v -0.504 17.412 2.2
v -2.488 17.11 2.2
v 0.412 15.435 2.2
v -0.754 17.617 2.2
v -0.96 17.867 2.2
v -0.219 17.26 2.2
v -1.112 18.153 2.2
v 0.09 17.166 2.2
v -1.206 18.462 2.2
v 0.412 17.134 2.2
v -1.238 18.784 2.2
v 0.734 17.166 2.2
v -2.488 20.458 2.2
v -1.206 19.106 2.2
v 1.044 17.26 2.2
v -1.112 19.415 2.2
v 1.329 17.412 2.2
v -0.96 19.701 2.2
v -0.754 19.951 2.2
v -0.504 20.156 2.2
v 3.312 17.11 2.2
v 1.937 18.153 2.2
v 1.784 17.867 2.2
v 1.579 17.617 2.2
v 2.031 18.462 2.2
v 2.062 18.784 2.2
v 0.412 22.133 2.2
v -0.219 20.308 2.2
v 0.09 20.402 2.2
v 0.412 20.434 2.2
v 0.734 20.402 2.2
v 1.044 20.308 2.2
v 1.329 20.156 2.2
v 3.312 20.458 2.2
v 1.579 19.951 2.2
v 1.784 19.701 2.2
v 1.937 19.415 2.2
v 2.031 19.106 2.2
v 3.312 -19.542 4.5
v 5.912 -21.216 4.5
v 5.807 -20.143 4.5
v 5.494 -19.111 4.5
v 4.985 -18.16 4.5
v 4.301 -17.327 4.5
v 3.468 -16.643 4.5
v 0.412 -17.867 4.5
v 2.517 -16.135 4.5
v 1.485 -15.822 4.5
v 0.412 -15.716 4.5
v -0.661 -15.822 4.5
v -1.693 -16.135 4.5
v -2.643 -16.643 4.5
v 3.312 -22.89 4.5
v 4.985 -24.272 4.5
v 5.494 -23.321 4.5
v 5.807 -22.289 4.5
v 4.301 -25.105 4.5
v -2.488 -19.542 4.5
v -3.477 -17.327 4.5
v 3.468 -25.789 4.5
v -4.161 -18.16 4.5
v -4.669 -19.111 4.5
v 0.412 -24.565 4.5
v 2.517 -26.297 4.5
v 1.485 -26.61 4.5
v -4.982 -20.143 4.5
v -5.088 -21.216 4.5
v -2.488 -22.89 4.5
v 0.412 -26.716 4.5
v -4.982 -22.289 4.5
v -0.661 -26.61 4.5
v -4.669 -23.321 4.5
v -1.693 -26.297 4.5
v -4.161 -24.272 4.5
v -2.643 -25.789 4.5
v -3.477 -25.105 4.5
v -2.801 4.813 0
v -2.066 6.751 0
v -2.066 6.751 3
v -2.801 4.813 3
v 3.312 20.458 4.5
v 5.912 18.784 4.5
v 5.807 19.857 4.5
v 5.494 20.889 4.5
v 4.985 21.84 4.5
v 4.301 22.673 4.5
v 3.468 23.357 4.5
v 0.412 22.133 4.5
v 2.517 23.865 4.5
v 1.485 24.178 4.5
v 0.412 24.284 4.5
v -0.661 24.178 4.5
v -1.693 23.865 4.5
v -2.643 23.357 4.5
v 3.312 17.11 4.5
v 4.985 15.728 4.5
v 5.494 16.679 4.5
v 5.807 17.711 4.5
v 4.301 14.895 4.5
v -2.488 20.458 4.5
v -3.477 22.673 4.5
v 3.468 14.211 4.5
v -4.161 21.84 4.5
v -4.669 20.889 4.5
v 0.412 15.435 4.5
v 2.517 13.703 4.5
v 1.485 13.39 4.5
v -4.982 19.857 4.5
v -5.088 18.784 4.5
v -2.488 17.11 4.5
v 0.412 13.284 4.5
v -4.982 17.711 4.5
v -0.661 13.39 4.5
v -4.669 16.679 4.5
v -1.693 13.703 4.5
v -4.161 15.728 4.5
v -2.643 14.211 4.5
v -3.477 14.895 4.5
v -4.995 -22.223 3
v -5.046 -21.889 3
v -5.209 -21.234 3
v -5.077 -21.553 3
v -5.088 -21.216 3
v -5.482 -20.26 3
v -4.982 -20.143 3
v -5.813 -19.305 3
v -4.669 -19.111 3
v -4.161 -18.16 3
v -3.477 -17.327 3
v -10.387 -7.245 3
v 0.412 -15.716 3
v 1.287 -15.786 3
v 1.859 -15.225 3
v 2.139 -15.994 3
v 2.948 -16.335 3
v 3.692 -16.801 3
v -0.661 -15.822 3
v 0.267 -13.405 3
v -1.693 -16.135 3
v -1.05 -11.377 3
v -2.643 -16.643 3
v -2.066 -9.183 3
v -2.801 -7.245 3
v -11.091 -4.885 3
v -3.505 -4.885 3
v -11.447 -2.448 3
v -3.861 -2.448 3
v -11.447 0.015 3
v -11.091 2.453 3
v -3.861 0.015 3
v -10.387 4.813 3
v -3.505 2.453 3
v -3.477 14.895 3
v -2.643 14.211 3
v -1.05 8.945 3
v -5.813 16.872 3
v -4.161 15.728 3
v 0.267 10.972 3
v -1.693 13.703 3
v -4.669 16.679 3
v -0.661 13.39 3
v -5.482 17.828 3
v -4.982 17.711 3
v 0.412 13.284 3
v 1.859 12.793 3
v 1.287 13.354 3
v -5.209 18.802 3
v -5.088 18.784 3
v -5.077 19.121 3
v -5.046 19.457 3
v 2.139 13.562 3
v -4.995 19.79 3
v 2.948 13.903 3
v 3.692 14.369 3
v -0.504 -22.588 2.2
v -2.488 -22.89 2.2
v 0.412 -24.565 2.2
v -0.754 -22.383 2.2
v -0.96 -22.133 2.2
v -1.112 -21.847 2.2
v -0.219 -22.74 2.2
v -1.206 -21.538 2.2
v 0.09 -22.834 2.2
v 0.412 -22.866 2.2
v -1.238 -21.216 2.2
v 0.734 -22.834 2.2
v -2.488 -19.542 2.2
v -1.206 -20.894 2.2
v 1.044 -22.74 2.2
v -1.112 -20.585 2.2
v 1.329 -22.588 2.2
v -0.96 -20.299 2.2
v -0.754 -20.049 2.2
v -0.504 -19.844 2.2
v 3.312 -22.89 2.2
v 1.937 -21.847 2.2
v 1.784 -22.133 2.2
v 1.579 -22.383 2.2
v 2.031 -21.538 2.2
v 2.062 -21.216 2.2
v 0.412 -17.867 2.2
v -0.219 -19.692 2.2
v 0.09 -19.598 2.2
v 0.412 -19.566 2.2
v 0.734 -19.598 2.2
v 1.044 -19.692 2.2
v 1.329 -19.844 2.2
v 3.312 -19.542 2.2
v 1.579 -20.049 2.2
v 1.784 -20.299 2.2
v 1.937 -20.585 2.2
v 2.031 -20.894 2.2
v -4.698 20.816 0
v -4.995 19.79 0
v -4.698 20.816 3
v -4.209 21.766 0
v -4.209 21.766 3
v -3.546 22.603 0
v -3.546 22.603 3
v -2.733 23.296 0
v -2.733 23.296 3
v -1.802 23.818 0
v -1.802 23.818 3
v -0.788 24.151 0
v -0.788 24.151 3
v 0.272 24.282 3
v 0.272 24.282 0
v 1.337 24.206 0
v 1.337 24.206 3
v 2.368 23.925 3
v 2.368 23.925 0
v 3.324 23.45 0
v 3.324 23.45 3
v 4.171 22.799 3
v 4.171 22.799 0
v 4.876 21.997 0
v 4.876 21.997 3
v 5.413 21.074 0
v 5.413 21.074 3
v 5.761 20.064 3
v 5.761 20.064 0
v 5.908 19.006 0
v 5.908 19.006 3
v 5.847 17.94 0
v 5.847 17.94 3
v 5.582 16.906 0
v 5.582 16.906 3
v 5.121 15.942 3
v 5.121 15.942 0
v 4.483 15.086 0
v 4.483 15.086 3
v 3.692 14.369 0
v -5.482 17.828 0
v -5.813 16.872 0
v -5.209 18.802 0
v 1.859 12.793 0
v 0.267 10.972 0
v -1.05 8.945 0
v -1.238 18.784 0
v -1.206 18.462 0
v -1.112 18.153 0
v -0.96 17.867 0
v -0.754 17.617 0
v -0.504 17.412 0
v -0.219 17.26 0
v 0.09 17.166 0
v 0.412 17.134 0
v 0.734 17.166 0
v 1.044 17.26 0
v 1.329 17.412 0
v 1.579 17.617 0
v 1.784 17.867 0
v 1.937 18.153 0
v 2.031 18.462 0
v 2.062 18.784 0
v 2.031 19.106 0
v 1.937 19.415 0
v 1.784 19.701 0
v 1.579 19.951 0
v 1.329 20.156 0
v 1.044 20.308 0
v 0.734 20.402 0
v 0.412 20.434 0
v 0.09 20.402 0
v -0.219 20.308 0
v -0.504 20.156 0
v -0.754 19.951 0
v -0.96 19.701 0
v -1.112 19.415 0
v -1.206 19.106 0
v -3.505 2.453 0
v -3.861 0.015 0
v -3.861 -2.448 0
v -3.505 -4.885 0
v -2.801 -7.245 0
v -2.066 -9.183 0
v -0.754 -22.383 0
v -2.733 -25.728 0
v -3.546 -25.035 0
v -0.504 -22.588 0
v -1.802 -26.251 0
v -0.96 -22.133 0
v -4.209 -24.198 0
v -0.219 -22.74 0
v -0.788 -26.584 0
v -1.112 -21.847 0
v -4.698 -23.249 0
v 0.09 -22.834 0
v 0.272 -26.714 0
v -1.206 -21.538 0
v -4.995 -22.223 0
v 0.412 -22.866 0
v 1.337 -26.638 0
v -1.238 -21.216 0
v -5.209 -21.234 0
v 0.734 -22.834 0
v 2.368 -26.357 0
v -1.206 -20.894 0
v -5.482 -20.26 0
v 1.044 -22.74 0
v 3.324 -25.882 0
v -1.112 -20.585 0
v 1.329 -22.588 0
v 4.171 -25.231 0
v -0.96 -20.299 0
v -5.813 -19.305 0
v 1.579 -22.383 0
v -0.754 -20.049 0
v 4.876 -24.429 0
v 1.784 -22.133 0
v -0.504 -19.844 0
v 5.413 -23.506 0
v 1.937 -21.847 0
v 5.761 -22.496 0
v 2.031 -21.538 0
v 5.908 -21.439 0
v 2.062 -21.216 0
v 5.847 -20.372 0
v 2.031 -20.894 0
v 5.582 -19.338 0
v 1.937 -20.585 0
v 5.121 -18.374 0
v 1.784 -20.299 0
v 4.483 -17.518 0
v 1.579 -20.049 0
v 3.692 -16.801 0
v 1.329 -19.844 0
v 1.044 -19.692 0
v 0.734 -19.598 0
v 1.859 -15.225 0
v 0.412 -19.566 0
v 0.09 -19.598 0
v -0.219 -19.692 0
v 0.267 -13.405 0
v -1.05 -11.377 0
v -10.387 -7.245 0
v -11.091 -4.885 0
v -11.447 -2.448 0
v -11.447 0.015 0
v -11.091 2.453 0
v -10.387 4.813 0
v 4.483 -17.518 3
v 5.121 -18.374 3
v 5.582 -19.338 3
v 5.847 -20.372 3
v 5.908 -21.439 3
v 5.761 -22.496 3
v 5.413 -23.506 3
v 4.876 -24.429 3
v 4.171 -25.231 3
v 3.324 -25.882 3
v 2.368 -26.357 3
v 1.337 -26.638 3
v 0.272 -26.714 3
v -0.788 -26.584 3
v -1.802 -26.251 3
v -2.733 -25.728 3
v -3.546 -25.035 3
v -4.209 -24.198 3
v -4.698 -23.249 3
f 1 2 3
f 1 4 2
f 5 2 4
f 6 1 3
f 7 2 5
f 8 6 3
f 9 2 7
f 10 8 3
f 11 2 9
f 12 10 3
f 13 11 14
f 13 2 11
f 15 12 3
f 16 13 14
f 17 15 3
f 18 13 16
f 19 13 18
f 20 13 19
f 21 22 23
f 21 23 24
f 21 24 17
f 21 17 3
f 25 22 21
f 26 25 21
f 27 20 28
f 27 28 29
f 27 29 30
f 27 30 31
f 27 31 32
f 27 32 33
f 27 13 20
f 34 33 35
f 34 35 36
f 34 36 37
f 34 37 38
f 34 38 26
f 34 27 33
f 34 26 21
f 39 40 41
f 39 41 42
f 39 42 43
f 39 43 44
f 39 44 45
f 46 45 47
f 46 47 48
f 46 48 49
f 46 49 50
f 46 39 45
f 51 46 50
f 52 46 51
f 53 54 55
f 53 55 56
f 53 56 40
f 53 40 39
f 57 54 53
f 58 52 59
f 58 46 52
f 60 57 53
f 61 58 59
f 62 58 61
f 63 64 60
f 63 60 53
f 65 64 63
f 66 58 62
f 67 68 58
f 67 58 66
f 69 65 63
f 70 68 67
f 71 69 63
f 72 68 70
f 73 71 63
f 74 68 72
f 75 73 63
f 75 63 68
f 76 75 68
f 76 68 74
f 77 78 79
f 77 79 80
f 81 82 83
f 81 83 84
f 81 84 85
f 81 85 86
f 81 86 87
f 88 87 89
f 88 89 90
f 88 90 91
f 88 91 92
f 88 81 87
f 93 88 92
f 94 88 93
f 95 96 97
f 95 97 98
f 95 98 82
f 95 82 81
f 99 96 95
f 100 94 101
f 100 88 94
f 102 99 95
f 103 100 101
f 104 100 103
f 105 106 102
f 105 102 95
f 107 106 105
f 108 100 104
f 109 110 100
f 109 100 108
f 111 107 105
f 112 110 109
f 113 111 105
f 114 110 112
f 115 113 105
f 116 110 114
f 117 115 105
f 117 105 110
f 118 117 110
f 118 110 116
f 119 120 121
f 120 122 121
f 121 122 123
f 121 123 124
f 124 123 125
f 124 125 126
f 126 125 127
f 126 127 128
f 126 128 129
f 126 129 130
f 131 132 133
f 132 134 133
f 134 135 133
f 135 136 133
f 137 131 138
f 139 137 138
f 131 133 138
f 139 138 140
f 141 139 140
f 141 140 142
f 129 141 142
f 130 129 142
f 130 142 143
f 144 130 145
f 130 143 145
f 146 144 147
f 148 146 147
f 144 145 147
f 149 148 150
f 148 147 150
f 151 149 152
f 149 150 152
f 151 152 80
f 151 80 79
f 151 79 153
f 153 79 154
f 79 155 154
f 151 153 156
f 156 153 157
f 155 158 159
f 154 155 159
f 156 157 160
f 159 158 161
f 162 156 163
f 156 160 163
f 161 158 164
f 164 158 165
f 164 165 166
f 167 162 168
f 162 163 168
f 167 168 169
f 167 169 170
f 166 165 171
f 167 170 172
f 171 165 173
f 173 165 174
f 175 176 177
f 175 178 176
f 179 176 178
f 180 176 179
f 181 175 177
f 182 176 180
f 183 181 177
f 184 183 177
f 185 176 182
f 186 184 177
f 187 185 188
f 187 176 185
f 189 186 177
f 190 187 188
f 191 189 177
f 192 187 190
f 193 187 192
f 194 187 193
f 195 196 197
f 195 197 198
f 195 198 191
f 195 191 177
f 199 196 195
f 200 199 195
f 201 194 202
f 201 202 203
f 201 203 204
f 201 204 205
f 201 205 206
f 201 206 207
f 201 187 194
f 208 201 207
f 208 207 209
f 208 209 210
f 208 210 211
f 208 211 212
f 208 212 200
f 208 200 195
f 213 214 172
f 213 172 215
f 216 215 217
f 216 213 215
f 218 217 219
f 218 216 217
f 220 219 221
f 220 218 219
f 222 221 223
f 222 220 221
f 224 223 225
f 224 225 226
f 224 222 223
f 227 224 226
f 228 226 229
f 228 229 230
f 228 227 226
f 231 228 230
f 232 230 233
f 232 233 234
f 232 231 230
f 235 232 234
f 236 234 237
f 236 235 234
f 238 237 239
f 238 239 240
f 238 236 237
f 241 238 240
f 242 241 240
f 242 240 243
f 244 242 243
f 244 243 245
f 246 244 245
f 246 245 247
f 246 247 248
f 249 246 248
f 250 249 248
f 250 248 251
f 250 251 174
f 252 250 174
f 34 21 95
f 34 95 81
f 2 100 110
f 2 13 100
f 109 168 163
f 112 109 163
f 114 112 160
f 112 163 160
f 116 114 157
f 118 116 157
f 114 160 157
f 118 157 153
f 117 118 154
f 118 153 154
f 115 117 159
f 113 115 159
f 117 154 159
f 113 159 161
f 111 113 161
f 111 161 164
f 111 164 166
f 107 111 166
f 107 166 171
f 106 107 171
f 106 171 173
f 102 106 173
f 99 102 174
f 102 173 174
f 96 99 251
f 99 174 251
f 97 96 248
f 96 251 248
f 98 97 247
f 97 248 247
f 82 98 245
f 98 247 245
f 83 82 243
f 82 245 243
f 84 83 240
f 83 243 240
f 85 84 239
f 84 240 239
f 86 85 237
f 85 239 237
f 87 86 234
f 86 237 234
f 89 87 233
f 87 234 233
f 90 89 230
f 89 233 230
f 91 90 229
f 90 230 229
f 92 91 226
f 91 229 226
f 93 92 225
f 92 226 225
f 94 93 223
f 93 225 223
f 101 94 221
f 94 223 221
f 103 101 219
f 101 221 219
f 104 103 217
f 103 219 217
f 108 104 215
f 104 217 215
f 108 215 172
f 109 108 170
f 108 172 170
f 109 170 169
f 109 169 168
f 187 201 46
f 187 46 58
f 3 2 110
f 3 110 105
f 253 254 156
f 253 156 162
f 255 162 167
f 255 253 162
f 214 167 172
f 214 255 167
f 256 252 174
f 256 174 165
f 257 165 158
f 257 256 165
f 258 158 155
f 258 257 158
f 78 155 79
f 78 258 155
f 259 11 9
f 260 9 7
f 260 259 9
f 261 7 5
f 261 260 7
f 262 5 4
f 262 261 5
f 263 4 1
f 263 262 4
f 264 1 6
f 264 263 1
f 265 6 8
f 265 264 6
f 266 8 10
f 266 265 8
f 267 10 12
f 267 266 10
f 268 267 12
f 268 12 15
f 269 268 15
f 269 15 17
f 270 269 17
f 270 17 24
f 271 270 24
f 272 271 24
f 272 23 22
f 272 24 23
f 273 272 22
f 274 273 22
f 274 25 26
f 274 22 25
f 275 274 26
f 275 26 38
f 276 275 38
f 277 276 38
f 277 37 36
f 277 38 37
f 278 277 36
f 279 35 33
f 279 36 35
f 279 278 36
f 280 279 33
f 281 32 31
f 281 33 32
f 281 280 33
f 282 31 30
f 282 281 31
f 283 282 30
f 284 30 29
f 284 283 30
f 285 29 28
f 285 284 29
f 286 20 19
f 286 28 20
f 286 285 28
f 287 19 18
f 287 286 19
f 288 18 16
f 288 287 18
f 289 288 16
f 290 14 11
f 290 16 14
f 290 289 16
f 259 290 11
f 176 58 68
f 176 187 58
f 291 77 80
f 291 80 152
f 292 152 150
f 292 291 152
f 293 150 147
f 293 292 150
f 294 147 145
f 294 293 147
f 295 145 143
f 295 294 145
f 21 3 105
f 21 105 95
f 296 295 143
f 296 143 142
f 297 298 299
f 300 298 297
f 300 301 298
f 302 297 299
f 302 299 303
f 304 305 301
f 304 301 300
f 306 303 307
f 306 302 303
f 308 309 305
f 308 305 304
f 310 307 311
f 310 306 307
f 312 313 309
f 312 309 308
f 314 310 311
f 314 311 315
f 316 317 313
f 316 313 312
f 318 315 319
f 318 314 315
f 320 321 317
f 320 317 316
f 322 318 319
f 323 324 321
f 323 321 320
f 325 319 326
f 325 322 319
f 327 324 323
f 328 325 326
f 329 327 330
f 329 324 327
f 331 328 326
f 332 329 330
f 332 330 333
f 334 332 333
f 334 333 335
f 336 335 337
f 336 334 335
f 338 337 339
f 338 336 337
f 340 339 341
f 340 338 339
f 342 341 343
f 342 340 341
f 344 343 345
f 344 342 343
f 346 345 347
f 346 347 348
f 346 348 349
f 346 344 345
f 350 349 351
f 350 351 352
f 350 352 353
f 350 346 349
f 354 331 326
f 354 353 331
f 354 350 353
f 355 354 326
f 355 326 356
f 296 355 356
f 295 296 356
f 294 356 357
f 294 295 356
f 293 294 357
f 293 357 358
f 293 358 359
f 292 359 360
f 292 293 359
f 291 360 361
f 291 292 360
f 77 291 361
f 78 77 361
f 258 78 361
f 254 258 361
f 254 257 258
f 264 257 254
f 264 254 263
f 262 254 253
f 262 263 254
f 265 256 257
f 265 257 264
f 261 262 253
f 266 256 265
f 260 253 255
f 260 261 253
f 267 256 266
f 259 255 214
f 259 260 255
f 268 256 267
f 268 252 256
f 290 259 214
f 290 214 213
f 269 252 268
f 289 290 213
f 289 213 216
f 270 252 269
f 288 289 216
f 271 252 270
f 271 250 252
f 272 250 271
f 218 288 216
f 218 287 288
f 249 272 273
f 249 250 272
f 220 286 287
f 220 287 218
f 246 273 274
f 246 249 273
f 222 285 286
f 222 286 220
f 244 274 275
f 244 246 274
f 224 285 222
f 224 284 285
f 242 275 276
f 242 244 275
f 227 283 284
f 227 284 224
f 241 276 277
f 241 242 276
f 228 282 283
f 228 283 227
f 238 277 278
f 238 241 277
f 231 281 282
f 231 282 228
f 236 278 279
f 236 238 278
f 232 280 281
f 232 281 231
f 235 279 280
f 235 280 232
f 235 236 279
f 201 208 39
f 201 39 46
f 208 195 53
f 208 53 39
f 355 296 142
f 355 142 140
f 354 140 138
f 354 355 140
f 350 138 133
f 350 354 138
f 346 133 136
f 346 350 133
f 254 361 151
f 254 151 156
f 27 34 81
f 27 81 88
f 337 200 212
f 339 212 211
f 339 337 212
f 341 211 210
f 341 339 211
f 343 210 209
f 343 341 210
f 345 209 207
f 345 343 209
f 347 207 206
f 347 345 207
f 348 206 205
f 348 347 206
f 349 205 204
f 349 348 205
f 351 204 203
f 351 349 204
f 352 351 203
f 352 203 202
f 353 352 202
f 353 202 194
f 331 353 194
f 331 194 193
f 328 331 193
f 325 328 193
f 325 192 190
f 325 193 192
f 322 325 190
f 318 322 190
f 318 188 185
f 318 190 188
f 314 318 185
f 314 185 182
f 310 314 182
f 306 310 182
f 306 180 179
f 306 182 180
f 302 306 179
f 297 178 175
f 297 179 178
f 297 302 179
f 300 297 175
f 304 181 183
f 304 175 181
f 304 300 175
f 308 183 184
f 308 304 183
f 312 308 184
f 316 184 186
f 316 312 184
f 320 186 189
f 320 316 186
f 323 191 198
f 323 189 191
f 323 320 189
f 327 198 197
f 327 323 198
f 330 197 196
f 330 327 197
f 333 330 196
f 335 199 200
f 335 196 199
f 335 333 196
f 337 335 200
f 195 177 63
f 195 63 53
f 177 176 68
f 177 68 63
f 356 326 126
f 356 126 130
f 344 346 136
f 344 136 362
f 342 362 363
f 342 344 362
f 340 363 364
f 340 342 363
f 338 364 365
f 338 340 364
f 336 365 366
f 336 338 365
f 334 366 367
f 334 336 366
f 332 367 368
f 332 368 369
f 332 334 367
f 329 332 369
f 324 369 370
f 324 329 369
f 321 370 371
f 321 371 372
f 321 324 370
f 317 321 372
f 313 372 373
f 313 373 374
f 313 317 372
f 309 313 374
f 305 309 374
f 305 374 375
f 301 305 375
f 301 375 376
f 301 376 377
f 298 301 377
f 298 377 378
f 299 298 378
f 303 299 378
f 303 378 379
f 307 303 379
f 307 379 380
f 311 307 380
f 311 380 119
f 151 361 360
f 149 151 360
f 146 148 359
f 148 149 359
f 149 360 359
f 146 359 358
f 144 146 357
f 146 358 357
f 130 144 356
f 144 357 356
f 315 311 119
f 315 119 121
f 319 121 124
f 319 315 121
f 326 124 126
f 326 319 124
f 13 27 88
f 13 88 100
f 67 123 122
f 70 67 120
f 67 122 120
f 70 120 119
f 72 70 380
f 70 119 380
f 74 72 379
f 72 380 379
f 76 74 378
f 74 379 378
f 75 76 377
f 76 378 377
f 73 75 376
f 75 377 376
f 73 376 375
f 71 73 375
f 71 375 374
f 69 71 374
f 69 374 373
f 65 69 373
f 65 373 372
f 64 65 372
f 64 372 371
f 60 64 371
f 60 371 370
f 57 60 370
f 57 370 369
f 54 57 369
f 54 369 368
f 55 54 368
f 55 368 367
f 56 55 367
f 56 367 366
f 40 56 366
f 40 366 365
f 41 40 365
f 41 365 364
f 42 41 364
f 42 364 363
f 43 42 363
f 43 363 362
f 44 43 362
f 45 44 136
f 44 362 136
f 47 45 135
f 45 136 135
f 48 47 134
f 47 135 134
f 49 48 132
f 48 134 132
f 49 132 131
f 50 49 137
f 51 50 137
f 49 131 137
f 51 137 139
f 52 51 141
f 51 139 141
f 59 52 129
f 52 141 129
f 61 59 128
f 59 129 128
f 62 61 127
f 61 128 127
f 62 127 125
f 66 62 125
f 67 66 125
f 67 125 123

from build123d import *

# Parameters (mm, degrees)
SKETCH_1_R          = 1.65
EXTRUDE_1_DEPTH     = 3
SKETCH_2_R          = 5.5
EXTRUDE_2_DEPTH     = 1.5
CUT_EXTRUDE_1_DEPTH = 0.8
FILLET_1_R          = 17


with BuildPart() as part:
    # 草图1 → 凸台-拉伸1 (new body)
    with BuildSketch(Plane.XY):
        with BuildLine():
            Line((-5.08774827, -1.216070925), (0.41225173, -15.716070925))
            ThreePointArc((0.41225173, -15.716070925), (4.301339026, -25.105158222), (-5.08774827, -21.216070925))
            Line((-5.08774827, -21.216070925), (-12.673955167, -1.216070925))
            Line((-12.673955167, -1.216070925), (-5.08774827, 18.783929075))
            ThreePointArc((-5.08774827, 18.783929075), (4.301339026, 22.673016371), (0.41225173, 13.283929075))
            Line((0.41225173, 13.283929075), (-5.08774827, -1.216070925))
        make_face()
        with Locations((0.41225173, -21.216070925)):
            Circle(SKETCH_1_R, mode=Mode.SUBTRACT)
        with Locations(Location((0.41225173, 18.783929075, 0), (0, 0, 180))):
            Circle(SKETCH_1_R, mode=Mode.SUBTRACT)
    extrude(amount=EXTRUDE_1_DEPTH)

    # 草图2 → 凸台-拉伸2 (add)
    # profile 1 of 2: a face of its own
    with BuildSketch(Plane.XY.offset(3)):
        with Locations(Location((0.41225173, 18.783929075, 0), (0, 0, 180))):
            Circle(SKETCH_2_R)
        Polygon((-2.48774827, 20.458244856), (-2.48774827, 17.109613294), (0.41225173, 15.435297514), (3.31225173, 17.109613294), (3.31225173, 20.458244856), (0.41225173, 22.132560636), align=None, mode=Mode.SUBTRACT)
    # profile 2 of 2: a face of its own
    with BuildSketch(Plane.XY.offset(3)):
        with Locations(Location((0.41225173, -21.216070925, 0), (0, 0, 180))):
            Circle(SKETCH_2_R)
        Polygon((-2.48774827, -19.541755144), (-2.48774827, -22.890386706), (0.41225173, -24.564702486), (3.31225173, -22.890386706), (3.31225173, -19.541755144), (0.41225173, -17.867439364), align=None, mode=Mode.SUBTRACT)
    extrude(amount=EXTRUDE_2_DEPTH)

    # 草图3 → 切除-拉伸1 (cut)
    with BuildSketch(Plane.XY.offset(3)):
        Polygon((0.41225173, 22.132560636), (-2.48774827, 20.458244856), (-2.48774827, 17.109613294), (0.41225173, 15.435297514), (3.31225173, 17.109613294), (3.31225173, 20.458244856), align=None)
        Polygon((0.41225173, -17.867439364), (-2.48774827, -19.541755144), (-2.48774827, -22.890386706), (0.41225173, -24.564702486), (3.31225173, -22.890386706), (3.31225173, -19.541755144), align=None)
    extrude(amount=-CUT_EXTRUDE_1_DEPTH, mode=Mode.SUBTRACT)

    # 圆角1
    # the kernel refuses this fillet: 17 mm, written as the material it adds along each edge
    with BuildSketch(Plane(origin=(-5.08774827, 18.783929075, 0), x_dir=(0.09189054947258435, 0.9957691132574993, 0), z_dir=(0, 0, 1))) as fillet_1_piece_1:
        with BuildLine():
            CenterArc((2.572935385, 16.928074925), FILLET_1_R, 254.500123691, 10.227497936)
            Line((-1.970081643, 0.546347413), (0, 0))
            ThreePointArc((0, 0), (0.505398022, 0.023269877), (1.010796044, 0))
        make_face()
    extrude(amount=3)
    with BuildSketch(Plane(origin=(0.41225173, 13.283929075, 0), x_dir=(-0.3546542341205386, -0.9349975263177835, 0), z_dir=(0, 0, 1))) as fillet_1_piece_2:
        with BuildLine():
            CenterArc((6.987015843, 17), FILLET_1_R, 237.378356152, 32.621643848)
            ThreePointArc((-2.177496959, 2.681770183), (-0.872736529, 1.516278705), (0, 0))
            Line((0, 0), (6.987015843, 0))
        make_face()
    extrude(amount=3)
    with BuildSketch(Plane(origin=(-5.08774827, -1.216070925, 0), x_dir=(0.35465423412053854, 0.9349975263177835, 0), z_dir=(0, 0, 1))) as fillet_1_piece_3:
        with BuildLine():
            CenterArc((FILLET_1_R * 0.379310344828, -FILLET_1_R), FILLET_1_R, 90, 41.544509364)
            Line((-FILLET_1_R * 0.283891318374, -FILLET_1_R * 0.251559251559), (0, 0))
            Line((0, 0), (FILLET_1_R * 0.379310344828, 0))
        make_face()
    extrude(amount=3)
    with BuildSketch(Plane(origin=(0.41225173, -15.716070925, 0), x_dir=(-0.35465423412053854, 0.9349975263177834, 0), z_dir=(0, 0, 1))) as fillet_1_piece_4:
        with BuildLine():
            CenterArc((6.987015843, -17), FILLET_1_R, 90, 32.621643848)
            ThreePointArc((-2.177496959, -2.681770183), (-0.872736529, -1.516278705), (0, 0))
            Line((0, 0), (6.987015843, 0))
        make_face()
    extrude(amount=3)
    with BuildSketch(Plane(origin=(-5.08774827, -21.216070925, 0), x_dir=(0.09189054947258435, -0.9957691132574993, 0), z_dir=(0, 0, 1))) as fillet_1_piece_5:
        with BuildLine():
            CenterArc((2.572935385, -16.928074925), FILLET_1_R, 95.272378373, 10.227497936)
            Line((-1.970081643, -0.546347413), (0, 0))
            ThreePointArc((0, 0), (0.505398022, -0.023269877), (1.010796044, 0))
        make_face()
    extrude(amount=3)
    # the kernel refuses this fillet: 17 mm, written as the material it takes off along each edge
    with BuildSketch(Plane(origin=(-12.673955167, -1.216070925, -16.120689655), x_dir=(0.35465423412053854, 0.9349975263177835, 0), z_dir=(0, 0, 1))) as fillet_1_2_piece_1:
        with BuildLine():
            CenterArc((FILLET_1_R * 0.379310344828, -FILLET_1_R), FILLET_1_R, 90, 41.544509364)
            Line((-FILLET_1_R * 0.283891318374, -FILLET_1_R * 0.251559251559), (0, 0))
            Line((0, 0), (FILLET_1_R * 0.379310344828, 0))
        make_face()
    extrude(amount=35.24137931, mode=Mode.SUBTRACT)


solid = part.part
